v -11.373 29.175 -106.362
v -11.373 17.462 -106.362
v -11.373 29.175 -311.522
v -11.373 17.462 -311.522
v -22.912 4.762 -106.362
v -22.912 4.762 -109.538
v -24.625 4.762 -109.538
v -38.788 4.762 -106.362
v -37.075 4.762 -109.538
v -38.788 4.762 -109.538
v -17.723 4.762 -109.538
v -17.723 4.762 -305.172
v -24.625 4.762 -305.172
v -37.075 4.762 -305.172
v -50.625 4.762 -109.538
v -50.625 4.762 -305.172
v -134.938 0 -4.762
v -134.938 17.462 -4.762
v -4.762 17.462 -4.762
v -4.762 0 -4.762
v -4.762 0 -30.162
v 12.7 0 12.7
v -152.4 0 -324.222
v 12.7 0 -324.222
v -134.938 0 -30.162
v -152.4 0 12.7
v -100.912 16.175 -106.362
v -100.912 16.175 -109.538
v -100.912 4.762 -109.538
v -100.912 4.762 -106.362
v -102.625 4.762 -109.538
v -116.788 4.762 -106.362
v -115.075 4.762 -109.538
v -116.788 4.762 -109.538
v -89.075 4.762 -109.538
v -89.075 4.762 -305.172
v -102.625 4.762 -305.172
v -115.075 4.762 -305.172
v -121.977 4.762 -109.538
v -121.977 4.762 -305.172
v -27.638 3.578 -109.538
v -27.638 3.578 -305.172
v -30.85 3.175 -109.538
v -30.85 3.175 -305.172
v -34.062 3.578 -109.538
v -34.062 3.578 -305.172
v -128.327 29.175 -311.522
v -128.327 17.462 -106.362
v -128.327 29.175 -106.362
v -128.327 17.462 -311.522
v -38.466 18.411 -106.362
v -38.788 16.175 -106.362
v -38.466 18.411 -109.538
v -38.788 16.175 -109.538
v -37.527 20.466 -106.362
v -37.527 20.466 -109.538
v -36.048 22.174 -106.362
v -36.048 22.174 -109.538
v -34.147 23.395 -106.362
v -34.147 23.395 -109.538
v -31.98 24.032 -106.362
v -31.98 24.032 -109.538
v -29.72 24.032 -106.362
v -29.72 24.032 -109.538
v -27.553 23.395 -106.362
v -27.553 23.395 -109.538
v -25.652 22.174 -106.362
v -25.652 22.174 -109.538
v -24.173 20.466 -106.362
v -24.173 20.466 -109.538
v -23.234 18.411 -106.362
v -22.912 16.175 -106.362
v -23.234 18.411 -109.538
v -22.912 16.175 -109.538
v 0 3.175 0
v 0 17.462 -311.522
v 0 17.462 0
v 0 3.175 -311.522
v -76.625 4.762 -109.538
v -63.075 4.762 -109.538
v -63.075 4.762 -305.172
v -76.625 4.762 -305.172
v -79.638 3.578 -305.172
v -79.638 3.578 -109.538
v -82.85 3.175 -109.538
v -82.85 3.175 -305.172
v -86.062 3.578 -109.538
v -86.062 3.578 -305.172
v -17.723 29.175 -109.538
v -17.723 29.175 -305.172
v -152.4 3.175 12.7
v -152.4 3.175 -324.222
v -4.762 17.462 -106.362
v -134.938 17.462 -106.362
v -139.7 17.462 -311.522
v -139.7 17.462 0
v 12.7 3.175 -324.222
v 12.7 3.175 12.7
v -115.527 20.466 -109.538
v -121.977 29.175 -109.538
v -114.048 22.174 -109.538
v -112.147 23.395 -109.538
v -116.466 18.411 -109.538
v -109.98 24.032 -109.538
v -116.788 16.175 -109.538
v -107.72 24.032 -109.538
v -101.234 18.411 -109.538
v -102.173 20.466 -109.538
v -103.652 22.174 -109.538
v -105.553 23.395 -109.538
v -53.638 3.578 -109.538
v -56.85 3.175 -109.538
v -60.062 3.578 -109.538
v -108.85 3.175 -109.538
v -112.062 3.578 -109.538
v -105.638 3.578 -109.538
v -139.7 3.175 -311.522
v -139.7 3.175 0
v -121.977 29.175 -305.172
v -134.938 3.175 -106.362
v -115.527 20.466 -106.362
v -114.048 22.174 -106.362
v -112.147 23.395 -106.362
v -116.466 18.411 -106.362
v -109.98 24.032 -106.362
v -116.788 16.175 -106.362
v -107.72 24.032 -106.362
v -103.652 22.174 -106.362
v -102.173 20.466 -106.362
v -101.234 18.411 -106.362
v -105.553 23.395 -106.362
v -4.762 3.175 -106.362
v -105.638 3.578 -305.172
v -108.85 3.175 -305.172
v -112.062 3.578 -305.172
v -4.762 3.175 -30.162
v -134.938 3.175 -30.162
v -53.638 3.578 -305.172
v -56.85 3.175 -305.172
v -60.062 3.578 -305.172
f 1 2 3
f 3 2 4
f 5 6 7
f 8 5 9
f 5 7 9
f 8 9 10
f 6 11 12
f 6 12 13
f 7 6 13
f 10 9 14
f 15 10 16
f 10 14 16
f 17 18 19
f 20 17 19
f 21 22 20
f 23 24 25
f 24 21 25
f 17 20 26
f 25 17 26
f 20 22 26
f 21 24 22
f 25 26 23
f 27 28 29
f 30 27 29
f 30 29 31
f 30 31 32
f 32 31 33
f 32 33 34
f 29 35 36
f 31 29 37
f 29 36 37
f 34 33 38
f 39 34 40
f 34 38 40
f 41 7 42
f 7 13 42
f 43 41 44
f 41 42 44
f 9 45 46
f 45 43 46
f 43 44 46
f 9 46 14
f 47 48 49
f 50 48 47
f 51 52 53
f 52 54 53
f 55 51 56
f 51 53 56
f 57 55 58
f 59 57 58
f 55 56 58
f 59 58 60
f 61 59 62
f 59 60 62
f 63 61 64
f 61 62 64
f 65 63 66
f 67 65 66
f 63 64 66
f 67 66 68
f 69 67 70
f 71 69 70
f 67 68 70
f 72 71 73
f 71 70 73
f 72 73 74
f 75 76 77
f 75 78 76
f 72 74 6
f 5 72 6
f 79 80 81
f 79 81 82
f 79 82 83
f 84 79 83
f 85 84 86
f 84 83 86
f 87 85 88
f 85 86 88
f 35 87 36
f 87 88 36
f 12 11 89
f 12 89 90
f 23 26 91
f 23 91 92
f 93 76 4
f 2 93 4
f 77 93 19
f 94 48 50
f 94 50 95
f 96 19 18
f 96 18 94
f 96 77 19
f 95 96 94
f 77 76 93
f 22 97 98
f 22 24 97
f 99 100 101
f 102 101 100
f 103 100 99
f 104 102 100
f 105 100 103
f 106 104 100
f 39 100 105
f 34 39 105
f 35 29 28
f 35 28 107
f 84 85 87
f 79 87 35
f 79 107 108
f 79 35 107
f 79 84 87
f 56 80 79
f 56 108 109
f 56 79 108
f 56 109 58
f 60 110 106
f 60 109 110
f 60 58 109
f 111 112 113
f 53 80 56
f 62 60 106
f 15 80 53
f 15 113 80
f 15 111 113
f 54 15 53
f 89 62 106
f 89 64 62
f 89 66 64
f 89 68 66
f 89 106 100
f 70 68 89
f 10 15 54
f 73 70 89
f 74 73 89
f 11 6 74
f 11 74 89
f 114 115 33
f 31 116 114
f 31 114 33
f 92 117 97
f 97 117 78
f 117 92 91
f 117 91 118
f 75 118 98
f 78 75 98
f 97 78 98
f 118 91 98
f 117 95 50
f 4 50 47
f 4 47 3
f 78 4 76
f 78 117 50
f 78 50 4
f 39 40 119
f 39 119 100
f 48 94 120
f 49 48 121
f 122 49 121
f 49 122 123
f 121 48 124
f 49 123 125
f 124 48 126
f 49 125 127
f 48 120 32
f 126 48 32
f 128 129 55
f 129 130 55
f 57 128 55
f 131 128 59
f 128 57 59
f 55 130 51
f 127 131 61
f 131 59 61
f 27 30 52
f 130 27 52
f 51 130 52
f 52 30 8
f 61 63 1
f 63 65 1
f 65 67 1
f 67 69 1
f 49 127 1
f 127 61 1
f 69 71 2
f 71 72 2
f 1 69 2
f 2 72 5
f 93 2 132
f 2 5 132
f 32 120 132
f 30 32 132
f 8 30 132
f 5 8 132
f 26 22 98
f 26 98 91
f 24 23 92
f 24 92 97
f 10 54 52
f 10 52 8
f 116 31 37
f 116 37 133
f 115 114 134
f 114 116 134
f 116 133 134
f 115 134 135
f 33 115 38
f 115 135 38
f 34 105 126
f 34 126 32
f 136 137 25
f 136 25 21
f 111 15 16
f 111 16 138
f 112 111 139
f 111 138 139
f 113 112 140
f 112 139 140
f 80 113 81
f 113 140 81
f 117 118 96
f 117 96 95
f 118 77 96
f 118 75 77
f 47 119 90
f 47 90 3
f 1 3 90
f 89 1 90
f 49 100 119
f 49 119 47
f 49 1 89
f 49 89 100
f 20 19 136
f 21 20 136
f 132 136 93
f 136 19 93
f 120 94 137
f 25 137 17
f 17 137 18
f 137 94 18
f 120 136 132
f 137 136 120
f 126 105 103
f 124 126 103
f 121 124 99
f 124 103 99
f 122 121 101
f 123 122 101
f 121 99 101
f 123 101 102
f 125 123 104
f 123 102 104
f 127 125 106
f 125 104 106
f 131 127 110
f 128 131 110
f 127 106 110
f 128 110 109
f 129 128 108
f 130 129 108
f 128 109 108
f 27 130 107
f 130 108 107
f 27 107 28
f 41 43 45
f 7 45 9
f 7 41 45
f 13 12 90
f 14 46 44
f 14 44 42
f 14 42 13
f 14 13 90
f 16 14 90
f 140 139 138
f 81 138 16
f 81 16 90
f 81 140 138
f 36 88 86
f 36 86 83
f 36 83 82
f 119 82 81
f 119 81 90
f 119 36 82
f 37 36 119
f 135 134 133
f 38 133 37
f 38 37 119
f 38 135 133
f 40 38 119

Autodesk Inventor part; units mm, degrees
ref_plane "YZ Plane" through (0, 0, 0) normal (1, 0, 0) x (0, 1, 0)
ref_plane "XZ Plane" through (0, 0, 0) normal (0, 1, 0) x (-1, 0, 0)
sketch "Sketch1" plane through (0, 0, 0) normal (0, 1, 0) x (-1, 0, 0)
  line L0 (0, 0) -> (139.7, 0)
  line L1 (139.7, 0) -> (139.7, -311.5225)
  line L2 (139.7, -311.5225) -> (0, -311.5225)
  line L3 (0, -311.5225) -> (0, 0)
  line L4 (4.7625, -4.7625) -> (134.9375, -4.7625)
  line L5 (134.9375, -4.7625) -> (134.9375, -106.3625)
  line L6 (134.9375, -106.3625) -> (4.7625, -106.3625)
  line L7 (4.7625, -106.3625) -> (4.7625, -4.7625)
  line L8 (121.977, -109.5375) -> (17.723, -109.5375)
  line L9 (17.723, -109.5375) -> (17.723, -305.1725)
  line L10 (17.723, -305.1725) -> (121.977, -305.1725)
  line L11 (121.977, -305.1725) -> (121.977, -109.5375)
  line L12 (128.327, -106.3625) -> (128.327, -311.5225)
  line L13 (11.373, -106.3625) -> (11.373, -311.5225)
  point P0 (69.85, -305.1725)
  point P1 (69.85, -311.5225)
  dimension "d0" = 139.7
  dimension "d1" = 311.5225
  dimension "d2" = 4.7625
  dimension "d3" = 4.7625
  dimension "d4" = 4.7625
  dimension "d5" = 101.6
  dimension "d6" = 104.254
  dimension "d7" = 6.35
  dimension "d8" = 195.635
  dimension "d9" = 6.35
  dimension "d10" = 6.35
extrude "Extrusion1" add sketch "Sketch1" along normal blind 29.175 contours L13 L6 L12 L2
extrude "Extrusion2" add sketch "Sketch1" along normal blind 4.7625 contours L11 L10 L9 L8
extrude "Extrusion3" add sketch "Sketch1" along normal blind 3.175 contours L6 L7 L4 L5
extrude "Extrusion4" add sketch "Sketch1" along normal blind 17.4625 contours L0 L1 L2 L12 L6 L5 L4 L7 L13 L3
sketch "Sketch2" plane through (-121.977, 29.175, -305.1725) normal (0, 0, 1) x (1, 0, 0)
  circle A0 centre (13.127, -13) radius 13
  circle A1 centre (39.127, -13) radius 13
  circle A2 centre (65.127, -13) radius 13
  circle A3 centre (91.127, -13) radius 13
  line L0 (-6.35, 0) -> (110.604, 0) projected
  point P0 (121.977, -29.175)
  point P1 (52.127, -13)
  point P2 (52.127, 0)
  dimension "d20" = 26
  dimension "d21" = 26
  dimension "d19" = 26
  dimension "d22" = 26
extrude "Extrusion5" cut sketch "Sketch2" along normal up to surface (195.635 mm away) contours A0 | A1 | A2 | A3
sketch "Sketch3" plane through (-17.723, 29.175, -109.5375) normal (0, 0, -1) x (-1, 0, 0)
  arc A0 (84.9017, -24.4125) -> (97.3523, -24.4125) centre (91.127, -13) ccw projected
  arc A1 (6.9017, -24.4125) -> (19.3523, -24.4125) centre (13.127, -13) ccw projected
  arc A2 (99.0645, -13) -> (83.1895, -13) centre (91.127, -13) ccw
  arc A3 (21.0645, -13) -> (5.1895, -13) centre (13.127, -13) ccw
  line L0 (97.3523, -24.4125) -> (104.254, -24.4125) projected
  line L1 (71.3523, -24.4125) -> (84.9017, -24.4125) projected
  line L2 (0, -24.4125) -> (6.9017, -24.4125) projected
  line L3 (19.3523, -24.4125) -> (32.9017, -24.4125) projected
  line L4 (99.0645, -13) -> (99.0645, -24.4125)
  line L5 (83.1895, -13) -> (83.1895, -24.4125)
  line L6 (21.0645, -13) -> (21.0645, -24.4125)
  line L7 (5.1895, -13) -> (5.1895, -24.4125)
  line L8 (99.0645, -24.4125) -> (83.1895, -24.4125)
  line L9 (-12.9605, -26) -> (117.2145, -26) projected
  line L10 (5.1895, -24.4125) -> (21.0645, -24.4125)
  point P0 (-17.723, -29.175)
  dimension "d25" = 15.875
  dimension "d26" = 15.875
extrude "Extrusion6" cut sketch "Sketch3" against normal up to surface (3.175 mm away) contours L1 L5 A2 L4 L0 L8 | L2 L7 A3 L6 L3 L10
sketch "Sketch5" plane through (0, 0, 0) normal (0, -1, 0) x (1, 0, 0)
  line L0 (12.7, 12.7) -> (-152.4, 12.7)
  line L1 (-152.4, 12.7) -> (-152.4, -324.2225)
  line L2 (-152.4, -324.2225) -> (12.7, -324.2225)
  line L3 (12.7, -324.2225) -> (12.7, 12.7)
  line L4 (0, 0) -> (0, -311.5225) projected
  line L5 (-139.7, 0) -> (0, 0) projected
  line L6 (-139.7, -311.5225) -> (-139.7, 0) projected
  line L7 (0, -311.5225) -> (-139.7, -311.5225) projected
  dimension "d32" = 12.7
  dimension "d33" = 12.7
  dimension "d34" = 12.7
  dimension "d35" = 12.7
extrude "Extrusion8" add sketch "Sketch5" against normal blind 3.175 contours L3 L2 L1 L0 | L4 L7 L6 L5
sketch "Sketch4" plane through (0, 3.175, 0) normal (0, 1, 0) x (1, 0, 0)
  line L0 (-4.7625, 4.7625) -> (-4.7625, 106.3625) projected
  line L1 (-4.7625, 106.3625) -> (-134.9375, 106.3625) projected
  line L2 (-134.9375, 106.3625) -> (-134.9375, 4.7625) projected
  line L3 (-134.9375, 4.7625) -> (-4.7625, 4.7625) projected
  line L4 (-134.9375, 4.7625) -> (-134.9375, 106.3625) projected
  line L5 (-134.9375, 30.1625) -> (-4.7625, 30.1625)
  line L6 (-4.7625, 4.7625) -> (-4.7625, 106.3625) projected
  line L7 (-134.9375, 30.1625) -> (-134.9375, 4.7625)
  line L8 (-4.7625, 4.7625) -> (-4.7625, 30.1625)
  line L9 (-4.7625, 4.7625) -> (-134.9375, 4.7625)
  line L10 (-134.9375, 4.7625) -> (-4.7625, 4.7625) projected
  point P0 (0, 0)
  dimension "d29" = 25.4
extrude "Extrusion7" cut sketch "Sketch4" against normal blind 17.4625 contours L3 L2 L5 L0
ref_plane "Work Plane1" through (-69.85, 17.4625, 0) normal (1, 0, 0) x (0, 0, -1)
equation "\"d0\" = width"
equation "\"d1\" = length"
equation "\"d8\" = battery_length"
equation "\"d11\" = height"
equation "\"d13\" = bottom_thickness"
equation "\"width\" = 139.7"
equation "\"bottom_thickness\" = 4.7625"
equation "\"battery_length\" = 195.635"
equation "\"length\" = 311.5225"
equation "\"height\" = 29.175"
properties part number "BatteryBox" material "ABS Plastic"
